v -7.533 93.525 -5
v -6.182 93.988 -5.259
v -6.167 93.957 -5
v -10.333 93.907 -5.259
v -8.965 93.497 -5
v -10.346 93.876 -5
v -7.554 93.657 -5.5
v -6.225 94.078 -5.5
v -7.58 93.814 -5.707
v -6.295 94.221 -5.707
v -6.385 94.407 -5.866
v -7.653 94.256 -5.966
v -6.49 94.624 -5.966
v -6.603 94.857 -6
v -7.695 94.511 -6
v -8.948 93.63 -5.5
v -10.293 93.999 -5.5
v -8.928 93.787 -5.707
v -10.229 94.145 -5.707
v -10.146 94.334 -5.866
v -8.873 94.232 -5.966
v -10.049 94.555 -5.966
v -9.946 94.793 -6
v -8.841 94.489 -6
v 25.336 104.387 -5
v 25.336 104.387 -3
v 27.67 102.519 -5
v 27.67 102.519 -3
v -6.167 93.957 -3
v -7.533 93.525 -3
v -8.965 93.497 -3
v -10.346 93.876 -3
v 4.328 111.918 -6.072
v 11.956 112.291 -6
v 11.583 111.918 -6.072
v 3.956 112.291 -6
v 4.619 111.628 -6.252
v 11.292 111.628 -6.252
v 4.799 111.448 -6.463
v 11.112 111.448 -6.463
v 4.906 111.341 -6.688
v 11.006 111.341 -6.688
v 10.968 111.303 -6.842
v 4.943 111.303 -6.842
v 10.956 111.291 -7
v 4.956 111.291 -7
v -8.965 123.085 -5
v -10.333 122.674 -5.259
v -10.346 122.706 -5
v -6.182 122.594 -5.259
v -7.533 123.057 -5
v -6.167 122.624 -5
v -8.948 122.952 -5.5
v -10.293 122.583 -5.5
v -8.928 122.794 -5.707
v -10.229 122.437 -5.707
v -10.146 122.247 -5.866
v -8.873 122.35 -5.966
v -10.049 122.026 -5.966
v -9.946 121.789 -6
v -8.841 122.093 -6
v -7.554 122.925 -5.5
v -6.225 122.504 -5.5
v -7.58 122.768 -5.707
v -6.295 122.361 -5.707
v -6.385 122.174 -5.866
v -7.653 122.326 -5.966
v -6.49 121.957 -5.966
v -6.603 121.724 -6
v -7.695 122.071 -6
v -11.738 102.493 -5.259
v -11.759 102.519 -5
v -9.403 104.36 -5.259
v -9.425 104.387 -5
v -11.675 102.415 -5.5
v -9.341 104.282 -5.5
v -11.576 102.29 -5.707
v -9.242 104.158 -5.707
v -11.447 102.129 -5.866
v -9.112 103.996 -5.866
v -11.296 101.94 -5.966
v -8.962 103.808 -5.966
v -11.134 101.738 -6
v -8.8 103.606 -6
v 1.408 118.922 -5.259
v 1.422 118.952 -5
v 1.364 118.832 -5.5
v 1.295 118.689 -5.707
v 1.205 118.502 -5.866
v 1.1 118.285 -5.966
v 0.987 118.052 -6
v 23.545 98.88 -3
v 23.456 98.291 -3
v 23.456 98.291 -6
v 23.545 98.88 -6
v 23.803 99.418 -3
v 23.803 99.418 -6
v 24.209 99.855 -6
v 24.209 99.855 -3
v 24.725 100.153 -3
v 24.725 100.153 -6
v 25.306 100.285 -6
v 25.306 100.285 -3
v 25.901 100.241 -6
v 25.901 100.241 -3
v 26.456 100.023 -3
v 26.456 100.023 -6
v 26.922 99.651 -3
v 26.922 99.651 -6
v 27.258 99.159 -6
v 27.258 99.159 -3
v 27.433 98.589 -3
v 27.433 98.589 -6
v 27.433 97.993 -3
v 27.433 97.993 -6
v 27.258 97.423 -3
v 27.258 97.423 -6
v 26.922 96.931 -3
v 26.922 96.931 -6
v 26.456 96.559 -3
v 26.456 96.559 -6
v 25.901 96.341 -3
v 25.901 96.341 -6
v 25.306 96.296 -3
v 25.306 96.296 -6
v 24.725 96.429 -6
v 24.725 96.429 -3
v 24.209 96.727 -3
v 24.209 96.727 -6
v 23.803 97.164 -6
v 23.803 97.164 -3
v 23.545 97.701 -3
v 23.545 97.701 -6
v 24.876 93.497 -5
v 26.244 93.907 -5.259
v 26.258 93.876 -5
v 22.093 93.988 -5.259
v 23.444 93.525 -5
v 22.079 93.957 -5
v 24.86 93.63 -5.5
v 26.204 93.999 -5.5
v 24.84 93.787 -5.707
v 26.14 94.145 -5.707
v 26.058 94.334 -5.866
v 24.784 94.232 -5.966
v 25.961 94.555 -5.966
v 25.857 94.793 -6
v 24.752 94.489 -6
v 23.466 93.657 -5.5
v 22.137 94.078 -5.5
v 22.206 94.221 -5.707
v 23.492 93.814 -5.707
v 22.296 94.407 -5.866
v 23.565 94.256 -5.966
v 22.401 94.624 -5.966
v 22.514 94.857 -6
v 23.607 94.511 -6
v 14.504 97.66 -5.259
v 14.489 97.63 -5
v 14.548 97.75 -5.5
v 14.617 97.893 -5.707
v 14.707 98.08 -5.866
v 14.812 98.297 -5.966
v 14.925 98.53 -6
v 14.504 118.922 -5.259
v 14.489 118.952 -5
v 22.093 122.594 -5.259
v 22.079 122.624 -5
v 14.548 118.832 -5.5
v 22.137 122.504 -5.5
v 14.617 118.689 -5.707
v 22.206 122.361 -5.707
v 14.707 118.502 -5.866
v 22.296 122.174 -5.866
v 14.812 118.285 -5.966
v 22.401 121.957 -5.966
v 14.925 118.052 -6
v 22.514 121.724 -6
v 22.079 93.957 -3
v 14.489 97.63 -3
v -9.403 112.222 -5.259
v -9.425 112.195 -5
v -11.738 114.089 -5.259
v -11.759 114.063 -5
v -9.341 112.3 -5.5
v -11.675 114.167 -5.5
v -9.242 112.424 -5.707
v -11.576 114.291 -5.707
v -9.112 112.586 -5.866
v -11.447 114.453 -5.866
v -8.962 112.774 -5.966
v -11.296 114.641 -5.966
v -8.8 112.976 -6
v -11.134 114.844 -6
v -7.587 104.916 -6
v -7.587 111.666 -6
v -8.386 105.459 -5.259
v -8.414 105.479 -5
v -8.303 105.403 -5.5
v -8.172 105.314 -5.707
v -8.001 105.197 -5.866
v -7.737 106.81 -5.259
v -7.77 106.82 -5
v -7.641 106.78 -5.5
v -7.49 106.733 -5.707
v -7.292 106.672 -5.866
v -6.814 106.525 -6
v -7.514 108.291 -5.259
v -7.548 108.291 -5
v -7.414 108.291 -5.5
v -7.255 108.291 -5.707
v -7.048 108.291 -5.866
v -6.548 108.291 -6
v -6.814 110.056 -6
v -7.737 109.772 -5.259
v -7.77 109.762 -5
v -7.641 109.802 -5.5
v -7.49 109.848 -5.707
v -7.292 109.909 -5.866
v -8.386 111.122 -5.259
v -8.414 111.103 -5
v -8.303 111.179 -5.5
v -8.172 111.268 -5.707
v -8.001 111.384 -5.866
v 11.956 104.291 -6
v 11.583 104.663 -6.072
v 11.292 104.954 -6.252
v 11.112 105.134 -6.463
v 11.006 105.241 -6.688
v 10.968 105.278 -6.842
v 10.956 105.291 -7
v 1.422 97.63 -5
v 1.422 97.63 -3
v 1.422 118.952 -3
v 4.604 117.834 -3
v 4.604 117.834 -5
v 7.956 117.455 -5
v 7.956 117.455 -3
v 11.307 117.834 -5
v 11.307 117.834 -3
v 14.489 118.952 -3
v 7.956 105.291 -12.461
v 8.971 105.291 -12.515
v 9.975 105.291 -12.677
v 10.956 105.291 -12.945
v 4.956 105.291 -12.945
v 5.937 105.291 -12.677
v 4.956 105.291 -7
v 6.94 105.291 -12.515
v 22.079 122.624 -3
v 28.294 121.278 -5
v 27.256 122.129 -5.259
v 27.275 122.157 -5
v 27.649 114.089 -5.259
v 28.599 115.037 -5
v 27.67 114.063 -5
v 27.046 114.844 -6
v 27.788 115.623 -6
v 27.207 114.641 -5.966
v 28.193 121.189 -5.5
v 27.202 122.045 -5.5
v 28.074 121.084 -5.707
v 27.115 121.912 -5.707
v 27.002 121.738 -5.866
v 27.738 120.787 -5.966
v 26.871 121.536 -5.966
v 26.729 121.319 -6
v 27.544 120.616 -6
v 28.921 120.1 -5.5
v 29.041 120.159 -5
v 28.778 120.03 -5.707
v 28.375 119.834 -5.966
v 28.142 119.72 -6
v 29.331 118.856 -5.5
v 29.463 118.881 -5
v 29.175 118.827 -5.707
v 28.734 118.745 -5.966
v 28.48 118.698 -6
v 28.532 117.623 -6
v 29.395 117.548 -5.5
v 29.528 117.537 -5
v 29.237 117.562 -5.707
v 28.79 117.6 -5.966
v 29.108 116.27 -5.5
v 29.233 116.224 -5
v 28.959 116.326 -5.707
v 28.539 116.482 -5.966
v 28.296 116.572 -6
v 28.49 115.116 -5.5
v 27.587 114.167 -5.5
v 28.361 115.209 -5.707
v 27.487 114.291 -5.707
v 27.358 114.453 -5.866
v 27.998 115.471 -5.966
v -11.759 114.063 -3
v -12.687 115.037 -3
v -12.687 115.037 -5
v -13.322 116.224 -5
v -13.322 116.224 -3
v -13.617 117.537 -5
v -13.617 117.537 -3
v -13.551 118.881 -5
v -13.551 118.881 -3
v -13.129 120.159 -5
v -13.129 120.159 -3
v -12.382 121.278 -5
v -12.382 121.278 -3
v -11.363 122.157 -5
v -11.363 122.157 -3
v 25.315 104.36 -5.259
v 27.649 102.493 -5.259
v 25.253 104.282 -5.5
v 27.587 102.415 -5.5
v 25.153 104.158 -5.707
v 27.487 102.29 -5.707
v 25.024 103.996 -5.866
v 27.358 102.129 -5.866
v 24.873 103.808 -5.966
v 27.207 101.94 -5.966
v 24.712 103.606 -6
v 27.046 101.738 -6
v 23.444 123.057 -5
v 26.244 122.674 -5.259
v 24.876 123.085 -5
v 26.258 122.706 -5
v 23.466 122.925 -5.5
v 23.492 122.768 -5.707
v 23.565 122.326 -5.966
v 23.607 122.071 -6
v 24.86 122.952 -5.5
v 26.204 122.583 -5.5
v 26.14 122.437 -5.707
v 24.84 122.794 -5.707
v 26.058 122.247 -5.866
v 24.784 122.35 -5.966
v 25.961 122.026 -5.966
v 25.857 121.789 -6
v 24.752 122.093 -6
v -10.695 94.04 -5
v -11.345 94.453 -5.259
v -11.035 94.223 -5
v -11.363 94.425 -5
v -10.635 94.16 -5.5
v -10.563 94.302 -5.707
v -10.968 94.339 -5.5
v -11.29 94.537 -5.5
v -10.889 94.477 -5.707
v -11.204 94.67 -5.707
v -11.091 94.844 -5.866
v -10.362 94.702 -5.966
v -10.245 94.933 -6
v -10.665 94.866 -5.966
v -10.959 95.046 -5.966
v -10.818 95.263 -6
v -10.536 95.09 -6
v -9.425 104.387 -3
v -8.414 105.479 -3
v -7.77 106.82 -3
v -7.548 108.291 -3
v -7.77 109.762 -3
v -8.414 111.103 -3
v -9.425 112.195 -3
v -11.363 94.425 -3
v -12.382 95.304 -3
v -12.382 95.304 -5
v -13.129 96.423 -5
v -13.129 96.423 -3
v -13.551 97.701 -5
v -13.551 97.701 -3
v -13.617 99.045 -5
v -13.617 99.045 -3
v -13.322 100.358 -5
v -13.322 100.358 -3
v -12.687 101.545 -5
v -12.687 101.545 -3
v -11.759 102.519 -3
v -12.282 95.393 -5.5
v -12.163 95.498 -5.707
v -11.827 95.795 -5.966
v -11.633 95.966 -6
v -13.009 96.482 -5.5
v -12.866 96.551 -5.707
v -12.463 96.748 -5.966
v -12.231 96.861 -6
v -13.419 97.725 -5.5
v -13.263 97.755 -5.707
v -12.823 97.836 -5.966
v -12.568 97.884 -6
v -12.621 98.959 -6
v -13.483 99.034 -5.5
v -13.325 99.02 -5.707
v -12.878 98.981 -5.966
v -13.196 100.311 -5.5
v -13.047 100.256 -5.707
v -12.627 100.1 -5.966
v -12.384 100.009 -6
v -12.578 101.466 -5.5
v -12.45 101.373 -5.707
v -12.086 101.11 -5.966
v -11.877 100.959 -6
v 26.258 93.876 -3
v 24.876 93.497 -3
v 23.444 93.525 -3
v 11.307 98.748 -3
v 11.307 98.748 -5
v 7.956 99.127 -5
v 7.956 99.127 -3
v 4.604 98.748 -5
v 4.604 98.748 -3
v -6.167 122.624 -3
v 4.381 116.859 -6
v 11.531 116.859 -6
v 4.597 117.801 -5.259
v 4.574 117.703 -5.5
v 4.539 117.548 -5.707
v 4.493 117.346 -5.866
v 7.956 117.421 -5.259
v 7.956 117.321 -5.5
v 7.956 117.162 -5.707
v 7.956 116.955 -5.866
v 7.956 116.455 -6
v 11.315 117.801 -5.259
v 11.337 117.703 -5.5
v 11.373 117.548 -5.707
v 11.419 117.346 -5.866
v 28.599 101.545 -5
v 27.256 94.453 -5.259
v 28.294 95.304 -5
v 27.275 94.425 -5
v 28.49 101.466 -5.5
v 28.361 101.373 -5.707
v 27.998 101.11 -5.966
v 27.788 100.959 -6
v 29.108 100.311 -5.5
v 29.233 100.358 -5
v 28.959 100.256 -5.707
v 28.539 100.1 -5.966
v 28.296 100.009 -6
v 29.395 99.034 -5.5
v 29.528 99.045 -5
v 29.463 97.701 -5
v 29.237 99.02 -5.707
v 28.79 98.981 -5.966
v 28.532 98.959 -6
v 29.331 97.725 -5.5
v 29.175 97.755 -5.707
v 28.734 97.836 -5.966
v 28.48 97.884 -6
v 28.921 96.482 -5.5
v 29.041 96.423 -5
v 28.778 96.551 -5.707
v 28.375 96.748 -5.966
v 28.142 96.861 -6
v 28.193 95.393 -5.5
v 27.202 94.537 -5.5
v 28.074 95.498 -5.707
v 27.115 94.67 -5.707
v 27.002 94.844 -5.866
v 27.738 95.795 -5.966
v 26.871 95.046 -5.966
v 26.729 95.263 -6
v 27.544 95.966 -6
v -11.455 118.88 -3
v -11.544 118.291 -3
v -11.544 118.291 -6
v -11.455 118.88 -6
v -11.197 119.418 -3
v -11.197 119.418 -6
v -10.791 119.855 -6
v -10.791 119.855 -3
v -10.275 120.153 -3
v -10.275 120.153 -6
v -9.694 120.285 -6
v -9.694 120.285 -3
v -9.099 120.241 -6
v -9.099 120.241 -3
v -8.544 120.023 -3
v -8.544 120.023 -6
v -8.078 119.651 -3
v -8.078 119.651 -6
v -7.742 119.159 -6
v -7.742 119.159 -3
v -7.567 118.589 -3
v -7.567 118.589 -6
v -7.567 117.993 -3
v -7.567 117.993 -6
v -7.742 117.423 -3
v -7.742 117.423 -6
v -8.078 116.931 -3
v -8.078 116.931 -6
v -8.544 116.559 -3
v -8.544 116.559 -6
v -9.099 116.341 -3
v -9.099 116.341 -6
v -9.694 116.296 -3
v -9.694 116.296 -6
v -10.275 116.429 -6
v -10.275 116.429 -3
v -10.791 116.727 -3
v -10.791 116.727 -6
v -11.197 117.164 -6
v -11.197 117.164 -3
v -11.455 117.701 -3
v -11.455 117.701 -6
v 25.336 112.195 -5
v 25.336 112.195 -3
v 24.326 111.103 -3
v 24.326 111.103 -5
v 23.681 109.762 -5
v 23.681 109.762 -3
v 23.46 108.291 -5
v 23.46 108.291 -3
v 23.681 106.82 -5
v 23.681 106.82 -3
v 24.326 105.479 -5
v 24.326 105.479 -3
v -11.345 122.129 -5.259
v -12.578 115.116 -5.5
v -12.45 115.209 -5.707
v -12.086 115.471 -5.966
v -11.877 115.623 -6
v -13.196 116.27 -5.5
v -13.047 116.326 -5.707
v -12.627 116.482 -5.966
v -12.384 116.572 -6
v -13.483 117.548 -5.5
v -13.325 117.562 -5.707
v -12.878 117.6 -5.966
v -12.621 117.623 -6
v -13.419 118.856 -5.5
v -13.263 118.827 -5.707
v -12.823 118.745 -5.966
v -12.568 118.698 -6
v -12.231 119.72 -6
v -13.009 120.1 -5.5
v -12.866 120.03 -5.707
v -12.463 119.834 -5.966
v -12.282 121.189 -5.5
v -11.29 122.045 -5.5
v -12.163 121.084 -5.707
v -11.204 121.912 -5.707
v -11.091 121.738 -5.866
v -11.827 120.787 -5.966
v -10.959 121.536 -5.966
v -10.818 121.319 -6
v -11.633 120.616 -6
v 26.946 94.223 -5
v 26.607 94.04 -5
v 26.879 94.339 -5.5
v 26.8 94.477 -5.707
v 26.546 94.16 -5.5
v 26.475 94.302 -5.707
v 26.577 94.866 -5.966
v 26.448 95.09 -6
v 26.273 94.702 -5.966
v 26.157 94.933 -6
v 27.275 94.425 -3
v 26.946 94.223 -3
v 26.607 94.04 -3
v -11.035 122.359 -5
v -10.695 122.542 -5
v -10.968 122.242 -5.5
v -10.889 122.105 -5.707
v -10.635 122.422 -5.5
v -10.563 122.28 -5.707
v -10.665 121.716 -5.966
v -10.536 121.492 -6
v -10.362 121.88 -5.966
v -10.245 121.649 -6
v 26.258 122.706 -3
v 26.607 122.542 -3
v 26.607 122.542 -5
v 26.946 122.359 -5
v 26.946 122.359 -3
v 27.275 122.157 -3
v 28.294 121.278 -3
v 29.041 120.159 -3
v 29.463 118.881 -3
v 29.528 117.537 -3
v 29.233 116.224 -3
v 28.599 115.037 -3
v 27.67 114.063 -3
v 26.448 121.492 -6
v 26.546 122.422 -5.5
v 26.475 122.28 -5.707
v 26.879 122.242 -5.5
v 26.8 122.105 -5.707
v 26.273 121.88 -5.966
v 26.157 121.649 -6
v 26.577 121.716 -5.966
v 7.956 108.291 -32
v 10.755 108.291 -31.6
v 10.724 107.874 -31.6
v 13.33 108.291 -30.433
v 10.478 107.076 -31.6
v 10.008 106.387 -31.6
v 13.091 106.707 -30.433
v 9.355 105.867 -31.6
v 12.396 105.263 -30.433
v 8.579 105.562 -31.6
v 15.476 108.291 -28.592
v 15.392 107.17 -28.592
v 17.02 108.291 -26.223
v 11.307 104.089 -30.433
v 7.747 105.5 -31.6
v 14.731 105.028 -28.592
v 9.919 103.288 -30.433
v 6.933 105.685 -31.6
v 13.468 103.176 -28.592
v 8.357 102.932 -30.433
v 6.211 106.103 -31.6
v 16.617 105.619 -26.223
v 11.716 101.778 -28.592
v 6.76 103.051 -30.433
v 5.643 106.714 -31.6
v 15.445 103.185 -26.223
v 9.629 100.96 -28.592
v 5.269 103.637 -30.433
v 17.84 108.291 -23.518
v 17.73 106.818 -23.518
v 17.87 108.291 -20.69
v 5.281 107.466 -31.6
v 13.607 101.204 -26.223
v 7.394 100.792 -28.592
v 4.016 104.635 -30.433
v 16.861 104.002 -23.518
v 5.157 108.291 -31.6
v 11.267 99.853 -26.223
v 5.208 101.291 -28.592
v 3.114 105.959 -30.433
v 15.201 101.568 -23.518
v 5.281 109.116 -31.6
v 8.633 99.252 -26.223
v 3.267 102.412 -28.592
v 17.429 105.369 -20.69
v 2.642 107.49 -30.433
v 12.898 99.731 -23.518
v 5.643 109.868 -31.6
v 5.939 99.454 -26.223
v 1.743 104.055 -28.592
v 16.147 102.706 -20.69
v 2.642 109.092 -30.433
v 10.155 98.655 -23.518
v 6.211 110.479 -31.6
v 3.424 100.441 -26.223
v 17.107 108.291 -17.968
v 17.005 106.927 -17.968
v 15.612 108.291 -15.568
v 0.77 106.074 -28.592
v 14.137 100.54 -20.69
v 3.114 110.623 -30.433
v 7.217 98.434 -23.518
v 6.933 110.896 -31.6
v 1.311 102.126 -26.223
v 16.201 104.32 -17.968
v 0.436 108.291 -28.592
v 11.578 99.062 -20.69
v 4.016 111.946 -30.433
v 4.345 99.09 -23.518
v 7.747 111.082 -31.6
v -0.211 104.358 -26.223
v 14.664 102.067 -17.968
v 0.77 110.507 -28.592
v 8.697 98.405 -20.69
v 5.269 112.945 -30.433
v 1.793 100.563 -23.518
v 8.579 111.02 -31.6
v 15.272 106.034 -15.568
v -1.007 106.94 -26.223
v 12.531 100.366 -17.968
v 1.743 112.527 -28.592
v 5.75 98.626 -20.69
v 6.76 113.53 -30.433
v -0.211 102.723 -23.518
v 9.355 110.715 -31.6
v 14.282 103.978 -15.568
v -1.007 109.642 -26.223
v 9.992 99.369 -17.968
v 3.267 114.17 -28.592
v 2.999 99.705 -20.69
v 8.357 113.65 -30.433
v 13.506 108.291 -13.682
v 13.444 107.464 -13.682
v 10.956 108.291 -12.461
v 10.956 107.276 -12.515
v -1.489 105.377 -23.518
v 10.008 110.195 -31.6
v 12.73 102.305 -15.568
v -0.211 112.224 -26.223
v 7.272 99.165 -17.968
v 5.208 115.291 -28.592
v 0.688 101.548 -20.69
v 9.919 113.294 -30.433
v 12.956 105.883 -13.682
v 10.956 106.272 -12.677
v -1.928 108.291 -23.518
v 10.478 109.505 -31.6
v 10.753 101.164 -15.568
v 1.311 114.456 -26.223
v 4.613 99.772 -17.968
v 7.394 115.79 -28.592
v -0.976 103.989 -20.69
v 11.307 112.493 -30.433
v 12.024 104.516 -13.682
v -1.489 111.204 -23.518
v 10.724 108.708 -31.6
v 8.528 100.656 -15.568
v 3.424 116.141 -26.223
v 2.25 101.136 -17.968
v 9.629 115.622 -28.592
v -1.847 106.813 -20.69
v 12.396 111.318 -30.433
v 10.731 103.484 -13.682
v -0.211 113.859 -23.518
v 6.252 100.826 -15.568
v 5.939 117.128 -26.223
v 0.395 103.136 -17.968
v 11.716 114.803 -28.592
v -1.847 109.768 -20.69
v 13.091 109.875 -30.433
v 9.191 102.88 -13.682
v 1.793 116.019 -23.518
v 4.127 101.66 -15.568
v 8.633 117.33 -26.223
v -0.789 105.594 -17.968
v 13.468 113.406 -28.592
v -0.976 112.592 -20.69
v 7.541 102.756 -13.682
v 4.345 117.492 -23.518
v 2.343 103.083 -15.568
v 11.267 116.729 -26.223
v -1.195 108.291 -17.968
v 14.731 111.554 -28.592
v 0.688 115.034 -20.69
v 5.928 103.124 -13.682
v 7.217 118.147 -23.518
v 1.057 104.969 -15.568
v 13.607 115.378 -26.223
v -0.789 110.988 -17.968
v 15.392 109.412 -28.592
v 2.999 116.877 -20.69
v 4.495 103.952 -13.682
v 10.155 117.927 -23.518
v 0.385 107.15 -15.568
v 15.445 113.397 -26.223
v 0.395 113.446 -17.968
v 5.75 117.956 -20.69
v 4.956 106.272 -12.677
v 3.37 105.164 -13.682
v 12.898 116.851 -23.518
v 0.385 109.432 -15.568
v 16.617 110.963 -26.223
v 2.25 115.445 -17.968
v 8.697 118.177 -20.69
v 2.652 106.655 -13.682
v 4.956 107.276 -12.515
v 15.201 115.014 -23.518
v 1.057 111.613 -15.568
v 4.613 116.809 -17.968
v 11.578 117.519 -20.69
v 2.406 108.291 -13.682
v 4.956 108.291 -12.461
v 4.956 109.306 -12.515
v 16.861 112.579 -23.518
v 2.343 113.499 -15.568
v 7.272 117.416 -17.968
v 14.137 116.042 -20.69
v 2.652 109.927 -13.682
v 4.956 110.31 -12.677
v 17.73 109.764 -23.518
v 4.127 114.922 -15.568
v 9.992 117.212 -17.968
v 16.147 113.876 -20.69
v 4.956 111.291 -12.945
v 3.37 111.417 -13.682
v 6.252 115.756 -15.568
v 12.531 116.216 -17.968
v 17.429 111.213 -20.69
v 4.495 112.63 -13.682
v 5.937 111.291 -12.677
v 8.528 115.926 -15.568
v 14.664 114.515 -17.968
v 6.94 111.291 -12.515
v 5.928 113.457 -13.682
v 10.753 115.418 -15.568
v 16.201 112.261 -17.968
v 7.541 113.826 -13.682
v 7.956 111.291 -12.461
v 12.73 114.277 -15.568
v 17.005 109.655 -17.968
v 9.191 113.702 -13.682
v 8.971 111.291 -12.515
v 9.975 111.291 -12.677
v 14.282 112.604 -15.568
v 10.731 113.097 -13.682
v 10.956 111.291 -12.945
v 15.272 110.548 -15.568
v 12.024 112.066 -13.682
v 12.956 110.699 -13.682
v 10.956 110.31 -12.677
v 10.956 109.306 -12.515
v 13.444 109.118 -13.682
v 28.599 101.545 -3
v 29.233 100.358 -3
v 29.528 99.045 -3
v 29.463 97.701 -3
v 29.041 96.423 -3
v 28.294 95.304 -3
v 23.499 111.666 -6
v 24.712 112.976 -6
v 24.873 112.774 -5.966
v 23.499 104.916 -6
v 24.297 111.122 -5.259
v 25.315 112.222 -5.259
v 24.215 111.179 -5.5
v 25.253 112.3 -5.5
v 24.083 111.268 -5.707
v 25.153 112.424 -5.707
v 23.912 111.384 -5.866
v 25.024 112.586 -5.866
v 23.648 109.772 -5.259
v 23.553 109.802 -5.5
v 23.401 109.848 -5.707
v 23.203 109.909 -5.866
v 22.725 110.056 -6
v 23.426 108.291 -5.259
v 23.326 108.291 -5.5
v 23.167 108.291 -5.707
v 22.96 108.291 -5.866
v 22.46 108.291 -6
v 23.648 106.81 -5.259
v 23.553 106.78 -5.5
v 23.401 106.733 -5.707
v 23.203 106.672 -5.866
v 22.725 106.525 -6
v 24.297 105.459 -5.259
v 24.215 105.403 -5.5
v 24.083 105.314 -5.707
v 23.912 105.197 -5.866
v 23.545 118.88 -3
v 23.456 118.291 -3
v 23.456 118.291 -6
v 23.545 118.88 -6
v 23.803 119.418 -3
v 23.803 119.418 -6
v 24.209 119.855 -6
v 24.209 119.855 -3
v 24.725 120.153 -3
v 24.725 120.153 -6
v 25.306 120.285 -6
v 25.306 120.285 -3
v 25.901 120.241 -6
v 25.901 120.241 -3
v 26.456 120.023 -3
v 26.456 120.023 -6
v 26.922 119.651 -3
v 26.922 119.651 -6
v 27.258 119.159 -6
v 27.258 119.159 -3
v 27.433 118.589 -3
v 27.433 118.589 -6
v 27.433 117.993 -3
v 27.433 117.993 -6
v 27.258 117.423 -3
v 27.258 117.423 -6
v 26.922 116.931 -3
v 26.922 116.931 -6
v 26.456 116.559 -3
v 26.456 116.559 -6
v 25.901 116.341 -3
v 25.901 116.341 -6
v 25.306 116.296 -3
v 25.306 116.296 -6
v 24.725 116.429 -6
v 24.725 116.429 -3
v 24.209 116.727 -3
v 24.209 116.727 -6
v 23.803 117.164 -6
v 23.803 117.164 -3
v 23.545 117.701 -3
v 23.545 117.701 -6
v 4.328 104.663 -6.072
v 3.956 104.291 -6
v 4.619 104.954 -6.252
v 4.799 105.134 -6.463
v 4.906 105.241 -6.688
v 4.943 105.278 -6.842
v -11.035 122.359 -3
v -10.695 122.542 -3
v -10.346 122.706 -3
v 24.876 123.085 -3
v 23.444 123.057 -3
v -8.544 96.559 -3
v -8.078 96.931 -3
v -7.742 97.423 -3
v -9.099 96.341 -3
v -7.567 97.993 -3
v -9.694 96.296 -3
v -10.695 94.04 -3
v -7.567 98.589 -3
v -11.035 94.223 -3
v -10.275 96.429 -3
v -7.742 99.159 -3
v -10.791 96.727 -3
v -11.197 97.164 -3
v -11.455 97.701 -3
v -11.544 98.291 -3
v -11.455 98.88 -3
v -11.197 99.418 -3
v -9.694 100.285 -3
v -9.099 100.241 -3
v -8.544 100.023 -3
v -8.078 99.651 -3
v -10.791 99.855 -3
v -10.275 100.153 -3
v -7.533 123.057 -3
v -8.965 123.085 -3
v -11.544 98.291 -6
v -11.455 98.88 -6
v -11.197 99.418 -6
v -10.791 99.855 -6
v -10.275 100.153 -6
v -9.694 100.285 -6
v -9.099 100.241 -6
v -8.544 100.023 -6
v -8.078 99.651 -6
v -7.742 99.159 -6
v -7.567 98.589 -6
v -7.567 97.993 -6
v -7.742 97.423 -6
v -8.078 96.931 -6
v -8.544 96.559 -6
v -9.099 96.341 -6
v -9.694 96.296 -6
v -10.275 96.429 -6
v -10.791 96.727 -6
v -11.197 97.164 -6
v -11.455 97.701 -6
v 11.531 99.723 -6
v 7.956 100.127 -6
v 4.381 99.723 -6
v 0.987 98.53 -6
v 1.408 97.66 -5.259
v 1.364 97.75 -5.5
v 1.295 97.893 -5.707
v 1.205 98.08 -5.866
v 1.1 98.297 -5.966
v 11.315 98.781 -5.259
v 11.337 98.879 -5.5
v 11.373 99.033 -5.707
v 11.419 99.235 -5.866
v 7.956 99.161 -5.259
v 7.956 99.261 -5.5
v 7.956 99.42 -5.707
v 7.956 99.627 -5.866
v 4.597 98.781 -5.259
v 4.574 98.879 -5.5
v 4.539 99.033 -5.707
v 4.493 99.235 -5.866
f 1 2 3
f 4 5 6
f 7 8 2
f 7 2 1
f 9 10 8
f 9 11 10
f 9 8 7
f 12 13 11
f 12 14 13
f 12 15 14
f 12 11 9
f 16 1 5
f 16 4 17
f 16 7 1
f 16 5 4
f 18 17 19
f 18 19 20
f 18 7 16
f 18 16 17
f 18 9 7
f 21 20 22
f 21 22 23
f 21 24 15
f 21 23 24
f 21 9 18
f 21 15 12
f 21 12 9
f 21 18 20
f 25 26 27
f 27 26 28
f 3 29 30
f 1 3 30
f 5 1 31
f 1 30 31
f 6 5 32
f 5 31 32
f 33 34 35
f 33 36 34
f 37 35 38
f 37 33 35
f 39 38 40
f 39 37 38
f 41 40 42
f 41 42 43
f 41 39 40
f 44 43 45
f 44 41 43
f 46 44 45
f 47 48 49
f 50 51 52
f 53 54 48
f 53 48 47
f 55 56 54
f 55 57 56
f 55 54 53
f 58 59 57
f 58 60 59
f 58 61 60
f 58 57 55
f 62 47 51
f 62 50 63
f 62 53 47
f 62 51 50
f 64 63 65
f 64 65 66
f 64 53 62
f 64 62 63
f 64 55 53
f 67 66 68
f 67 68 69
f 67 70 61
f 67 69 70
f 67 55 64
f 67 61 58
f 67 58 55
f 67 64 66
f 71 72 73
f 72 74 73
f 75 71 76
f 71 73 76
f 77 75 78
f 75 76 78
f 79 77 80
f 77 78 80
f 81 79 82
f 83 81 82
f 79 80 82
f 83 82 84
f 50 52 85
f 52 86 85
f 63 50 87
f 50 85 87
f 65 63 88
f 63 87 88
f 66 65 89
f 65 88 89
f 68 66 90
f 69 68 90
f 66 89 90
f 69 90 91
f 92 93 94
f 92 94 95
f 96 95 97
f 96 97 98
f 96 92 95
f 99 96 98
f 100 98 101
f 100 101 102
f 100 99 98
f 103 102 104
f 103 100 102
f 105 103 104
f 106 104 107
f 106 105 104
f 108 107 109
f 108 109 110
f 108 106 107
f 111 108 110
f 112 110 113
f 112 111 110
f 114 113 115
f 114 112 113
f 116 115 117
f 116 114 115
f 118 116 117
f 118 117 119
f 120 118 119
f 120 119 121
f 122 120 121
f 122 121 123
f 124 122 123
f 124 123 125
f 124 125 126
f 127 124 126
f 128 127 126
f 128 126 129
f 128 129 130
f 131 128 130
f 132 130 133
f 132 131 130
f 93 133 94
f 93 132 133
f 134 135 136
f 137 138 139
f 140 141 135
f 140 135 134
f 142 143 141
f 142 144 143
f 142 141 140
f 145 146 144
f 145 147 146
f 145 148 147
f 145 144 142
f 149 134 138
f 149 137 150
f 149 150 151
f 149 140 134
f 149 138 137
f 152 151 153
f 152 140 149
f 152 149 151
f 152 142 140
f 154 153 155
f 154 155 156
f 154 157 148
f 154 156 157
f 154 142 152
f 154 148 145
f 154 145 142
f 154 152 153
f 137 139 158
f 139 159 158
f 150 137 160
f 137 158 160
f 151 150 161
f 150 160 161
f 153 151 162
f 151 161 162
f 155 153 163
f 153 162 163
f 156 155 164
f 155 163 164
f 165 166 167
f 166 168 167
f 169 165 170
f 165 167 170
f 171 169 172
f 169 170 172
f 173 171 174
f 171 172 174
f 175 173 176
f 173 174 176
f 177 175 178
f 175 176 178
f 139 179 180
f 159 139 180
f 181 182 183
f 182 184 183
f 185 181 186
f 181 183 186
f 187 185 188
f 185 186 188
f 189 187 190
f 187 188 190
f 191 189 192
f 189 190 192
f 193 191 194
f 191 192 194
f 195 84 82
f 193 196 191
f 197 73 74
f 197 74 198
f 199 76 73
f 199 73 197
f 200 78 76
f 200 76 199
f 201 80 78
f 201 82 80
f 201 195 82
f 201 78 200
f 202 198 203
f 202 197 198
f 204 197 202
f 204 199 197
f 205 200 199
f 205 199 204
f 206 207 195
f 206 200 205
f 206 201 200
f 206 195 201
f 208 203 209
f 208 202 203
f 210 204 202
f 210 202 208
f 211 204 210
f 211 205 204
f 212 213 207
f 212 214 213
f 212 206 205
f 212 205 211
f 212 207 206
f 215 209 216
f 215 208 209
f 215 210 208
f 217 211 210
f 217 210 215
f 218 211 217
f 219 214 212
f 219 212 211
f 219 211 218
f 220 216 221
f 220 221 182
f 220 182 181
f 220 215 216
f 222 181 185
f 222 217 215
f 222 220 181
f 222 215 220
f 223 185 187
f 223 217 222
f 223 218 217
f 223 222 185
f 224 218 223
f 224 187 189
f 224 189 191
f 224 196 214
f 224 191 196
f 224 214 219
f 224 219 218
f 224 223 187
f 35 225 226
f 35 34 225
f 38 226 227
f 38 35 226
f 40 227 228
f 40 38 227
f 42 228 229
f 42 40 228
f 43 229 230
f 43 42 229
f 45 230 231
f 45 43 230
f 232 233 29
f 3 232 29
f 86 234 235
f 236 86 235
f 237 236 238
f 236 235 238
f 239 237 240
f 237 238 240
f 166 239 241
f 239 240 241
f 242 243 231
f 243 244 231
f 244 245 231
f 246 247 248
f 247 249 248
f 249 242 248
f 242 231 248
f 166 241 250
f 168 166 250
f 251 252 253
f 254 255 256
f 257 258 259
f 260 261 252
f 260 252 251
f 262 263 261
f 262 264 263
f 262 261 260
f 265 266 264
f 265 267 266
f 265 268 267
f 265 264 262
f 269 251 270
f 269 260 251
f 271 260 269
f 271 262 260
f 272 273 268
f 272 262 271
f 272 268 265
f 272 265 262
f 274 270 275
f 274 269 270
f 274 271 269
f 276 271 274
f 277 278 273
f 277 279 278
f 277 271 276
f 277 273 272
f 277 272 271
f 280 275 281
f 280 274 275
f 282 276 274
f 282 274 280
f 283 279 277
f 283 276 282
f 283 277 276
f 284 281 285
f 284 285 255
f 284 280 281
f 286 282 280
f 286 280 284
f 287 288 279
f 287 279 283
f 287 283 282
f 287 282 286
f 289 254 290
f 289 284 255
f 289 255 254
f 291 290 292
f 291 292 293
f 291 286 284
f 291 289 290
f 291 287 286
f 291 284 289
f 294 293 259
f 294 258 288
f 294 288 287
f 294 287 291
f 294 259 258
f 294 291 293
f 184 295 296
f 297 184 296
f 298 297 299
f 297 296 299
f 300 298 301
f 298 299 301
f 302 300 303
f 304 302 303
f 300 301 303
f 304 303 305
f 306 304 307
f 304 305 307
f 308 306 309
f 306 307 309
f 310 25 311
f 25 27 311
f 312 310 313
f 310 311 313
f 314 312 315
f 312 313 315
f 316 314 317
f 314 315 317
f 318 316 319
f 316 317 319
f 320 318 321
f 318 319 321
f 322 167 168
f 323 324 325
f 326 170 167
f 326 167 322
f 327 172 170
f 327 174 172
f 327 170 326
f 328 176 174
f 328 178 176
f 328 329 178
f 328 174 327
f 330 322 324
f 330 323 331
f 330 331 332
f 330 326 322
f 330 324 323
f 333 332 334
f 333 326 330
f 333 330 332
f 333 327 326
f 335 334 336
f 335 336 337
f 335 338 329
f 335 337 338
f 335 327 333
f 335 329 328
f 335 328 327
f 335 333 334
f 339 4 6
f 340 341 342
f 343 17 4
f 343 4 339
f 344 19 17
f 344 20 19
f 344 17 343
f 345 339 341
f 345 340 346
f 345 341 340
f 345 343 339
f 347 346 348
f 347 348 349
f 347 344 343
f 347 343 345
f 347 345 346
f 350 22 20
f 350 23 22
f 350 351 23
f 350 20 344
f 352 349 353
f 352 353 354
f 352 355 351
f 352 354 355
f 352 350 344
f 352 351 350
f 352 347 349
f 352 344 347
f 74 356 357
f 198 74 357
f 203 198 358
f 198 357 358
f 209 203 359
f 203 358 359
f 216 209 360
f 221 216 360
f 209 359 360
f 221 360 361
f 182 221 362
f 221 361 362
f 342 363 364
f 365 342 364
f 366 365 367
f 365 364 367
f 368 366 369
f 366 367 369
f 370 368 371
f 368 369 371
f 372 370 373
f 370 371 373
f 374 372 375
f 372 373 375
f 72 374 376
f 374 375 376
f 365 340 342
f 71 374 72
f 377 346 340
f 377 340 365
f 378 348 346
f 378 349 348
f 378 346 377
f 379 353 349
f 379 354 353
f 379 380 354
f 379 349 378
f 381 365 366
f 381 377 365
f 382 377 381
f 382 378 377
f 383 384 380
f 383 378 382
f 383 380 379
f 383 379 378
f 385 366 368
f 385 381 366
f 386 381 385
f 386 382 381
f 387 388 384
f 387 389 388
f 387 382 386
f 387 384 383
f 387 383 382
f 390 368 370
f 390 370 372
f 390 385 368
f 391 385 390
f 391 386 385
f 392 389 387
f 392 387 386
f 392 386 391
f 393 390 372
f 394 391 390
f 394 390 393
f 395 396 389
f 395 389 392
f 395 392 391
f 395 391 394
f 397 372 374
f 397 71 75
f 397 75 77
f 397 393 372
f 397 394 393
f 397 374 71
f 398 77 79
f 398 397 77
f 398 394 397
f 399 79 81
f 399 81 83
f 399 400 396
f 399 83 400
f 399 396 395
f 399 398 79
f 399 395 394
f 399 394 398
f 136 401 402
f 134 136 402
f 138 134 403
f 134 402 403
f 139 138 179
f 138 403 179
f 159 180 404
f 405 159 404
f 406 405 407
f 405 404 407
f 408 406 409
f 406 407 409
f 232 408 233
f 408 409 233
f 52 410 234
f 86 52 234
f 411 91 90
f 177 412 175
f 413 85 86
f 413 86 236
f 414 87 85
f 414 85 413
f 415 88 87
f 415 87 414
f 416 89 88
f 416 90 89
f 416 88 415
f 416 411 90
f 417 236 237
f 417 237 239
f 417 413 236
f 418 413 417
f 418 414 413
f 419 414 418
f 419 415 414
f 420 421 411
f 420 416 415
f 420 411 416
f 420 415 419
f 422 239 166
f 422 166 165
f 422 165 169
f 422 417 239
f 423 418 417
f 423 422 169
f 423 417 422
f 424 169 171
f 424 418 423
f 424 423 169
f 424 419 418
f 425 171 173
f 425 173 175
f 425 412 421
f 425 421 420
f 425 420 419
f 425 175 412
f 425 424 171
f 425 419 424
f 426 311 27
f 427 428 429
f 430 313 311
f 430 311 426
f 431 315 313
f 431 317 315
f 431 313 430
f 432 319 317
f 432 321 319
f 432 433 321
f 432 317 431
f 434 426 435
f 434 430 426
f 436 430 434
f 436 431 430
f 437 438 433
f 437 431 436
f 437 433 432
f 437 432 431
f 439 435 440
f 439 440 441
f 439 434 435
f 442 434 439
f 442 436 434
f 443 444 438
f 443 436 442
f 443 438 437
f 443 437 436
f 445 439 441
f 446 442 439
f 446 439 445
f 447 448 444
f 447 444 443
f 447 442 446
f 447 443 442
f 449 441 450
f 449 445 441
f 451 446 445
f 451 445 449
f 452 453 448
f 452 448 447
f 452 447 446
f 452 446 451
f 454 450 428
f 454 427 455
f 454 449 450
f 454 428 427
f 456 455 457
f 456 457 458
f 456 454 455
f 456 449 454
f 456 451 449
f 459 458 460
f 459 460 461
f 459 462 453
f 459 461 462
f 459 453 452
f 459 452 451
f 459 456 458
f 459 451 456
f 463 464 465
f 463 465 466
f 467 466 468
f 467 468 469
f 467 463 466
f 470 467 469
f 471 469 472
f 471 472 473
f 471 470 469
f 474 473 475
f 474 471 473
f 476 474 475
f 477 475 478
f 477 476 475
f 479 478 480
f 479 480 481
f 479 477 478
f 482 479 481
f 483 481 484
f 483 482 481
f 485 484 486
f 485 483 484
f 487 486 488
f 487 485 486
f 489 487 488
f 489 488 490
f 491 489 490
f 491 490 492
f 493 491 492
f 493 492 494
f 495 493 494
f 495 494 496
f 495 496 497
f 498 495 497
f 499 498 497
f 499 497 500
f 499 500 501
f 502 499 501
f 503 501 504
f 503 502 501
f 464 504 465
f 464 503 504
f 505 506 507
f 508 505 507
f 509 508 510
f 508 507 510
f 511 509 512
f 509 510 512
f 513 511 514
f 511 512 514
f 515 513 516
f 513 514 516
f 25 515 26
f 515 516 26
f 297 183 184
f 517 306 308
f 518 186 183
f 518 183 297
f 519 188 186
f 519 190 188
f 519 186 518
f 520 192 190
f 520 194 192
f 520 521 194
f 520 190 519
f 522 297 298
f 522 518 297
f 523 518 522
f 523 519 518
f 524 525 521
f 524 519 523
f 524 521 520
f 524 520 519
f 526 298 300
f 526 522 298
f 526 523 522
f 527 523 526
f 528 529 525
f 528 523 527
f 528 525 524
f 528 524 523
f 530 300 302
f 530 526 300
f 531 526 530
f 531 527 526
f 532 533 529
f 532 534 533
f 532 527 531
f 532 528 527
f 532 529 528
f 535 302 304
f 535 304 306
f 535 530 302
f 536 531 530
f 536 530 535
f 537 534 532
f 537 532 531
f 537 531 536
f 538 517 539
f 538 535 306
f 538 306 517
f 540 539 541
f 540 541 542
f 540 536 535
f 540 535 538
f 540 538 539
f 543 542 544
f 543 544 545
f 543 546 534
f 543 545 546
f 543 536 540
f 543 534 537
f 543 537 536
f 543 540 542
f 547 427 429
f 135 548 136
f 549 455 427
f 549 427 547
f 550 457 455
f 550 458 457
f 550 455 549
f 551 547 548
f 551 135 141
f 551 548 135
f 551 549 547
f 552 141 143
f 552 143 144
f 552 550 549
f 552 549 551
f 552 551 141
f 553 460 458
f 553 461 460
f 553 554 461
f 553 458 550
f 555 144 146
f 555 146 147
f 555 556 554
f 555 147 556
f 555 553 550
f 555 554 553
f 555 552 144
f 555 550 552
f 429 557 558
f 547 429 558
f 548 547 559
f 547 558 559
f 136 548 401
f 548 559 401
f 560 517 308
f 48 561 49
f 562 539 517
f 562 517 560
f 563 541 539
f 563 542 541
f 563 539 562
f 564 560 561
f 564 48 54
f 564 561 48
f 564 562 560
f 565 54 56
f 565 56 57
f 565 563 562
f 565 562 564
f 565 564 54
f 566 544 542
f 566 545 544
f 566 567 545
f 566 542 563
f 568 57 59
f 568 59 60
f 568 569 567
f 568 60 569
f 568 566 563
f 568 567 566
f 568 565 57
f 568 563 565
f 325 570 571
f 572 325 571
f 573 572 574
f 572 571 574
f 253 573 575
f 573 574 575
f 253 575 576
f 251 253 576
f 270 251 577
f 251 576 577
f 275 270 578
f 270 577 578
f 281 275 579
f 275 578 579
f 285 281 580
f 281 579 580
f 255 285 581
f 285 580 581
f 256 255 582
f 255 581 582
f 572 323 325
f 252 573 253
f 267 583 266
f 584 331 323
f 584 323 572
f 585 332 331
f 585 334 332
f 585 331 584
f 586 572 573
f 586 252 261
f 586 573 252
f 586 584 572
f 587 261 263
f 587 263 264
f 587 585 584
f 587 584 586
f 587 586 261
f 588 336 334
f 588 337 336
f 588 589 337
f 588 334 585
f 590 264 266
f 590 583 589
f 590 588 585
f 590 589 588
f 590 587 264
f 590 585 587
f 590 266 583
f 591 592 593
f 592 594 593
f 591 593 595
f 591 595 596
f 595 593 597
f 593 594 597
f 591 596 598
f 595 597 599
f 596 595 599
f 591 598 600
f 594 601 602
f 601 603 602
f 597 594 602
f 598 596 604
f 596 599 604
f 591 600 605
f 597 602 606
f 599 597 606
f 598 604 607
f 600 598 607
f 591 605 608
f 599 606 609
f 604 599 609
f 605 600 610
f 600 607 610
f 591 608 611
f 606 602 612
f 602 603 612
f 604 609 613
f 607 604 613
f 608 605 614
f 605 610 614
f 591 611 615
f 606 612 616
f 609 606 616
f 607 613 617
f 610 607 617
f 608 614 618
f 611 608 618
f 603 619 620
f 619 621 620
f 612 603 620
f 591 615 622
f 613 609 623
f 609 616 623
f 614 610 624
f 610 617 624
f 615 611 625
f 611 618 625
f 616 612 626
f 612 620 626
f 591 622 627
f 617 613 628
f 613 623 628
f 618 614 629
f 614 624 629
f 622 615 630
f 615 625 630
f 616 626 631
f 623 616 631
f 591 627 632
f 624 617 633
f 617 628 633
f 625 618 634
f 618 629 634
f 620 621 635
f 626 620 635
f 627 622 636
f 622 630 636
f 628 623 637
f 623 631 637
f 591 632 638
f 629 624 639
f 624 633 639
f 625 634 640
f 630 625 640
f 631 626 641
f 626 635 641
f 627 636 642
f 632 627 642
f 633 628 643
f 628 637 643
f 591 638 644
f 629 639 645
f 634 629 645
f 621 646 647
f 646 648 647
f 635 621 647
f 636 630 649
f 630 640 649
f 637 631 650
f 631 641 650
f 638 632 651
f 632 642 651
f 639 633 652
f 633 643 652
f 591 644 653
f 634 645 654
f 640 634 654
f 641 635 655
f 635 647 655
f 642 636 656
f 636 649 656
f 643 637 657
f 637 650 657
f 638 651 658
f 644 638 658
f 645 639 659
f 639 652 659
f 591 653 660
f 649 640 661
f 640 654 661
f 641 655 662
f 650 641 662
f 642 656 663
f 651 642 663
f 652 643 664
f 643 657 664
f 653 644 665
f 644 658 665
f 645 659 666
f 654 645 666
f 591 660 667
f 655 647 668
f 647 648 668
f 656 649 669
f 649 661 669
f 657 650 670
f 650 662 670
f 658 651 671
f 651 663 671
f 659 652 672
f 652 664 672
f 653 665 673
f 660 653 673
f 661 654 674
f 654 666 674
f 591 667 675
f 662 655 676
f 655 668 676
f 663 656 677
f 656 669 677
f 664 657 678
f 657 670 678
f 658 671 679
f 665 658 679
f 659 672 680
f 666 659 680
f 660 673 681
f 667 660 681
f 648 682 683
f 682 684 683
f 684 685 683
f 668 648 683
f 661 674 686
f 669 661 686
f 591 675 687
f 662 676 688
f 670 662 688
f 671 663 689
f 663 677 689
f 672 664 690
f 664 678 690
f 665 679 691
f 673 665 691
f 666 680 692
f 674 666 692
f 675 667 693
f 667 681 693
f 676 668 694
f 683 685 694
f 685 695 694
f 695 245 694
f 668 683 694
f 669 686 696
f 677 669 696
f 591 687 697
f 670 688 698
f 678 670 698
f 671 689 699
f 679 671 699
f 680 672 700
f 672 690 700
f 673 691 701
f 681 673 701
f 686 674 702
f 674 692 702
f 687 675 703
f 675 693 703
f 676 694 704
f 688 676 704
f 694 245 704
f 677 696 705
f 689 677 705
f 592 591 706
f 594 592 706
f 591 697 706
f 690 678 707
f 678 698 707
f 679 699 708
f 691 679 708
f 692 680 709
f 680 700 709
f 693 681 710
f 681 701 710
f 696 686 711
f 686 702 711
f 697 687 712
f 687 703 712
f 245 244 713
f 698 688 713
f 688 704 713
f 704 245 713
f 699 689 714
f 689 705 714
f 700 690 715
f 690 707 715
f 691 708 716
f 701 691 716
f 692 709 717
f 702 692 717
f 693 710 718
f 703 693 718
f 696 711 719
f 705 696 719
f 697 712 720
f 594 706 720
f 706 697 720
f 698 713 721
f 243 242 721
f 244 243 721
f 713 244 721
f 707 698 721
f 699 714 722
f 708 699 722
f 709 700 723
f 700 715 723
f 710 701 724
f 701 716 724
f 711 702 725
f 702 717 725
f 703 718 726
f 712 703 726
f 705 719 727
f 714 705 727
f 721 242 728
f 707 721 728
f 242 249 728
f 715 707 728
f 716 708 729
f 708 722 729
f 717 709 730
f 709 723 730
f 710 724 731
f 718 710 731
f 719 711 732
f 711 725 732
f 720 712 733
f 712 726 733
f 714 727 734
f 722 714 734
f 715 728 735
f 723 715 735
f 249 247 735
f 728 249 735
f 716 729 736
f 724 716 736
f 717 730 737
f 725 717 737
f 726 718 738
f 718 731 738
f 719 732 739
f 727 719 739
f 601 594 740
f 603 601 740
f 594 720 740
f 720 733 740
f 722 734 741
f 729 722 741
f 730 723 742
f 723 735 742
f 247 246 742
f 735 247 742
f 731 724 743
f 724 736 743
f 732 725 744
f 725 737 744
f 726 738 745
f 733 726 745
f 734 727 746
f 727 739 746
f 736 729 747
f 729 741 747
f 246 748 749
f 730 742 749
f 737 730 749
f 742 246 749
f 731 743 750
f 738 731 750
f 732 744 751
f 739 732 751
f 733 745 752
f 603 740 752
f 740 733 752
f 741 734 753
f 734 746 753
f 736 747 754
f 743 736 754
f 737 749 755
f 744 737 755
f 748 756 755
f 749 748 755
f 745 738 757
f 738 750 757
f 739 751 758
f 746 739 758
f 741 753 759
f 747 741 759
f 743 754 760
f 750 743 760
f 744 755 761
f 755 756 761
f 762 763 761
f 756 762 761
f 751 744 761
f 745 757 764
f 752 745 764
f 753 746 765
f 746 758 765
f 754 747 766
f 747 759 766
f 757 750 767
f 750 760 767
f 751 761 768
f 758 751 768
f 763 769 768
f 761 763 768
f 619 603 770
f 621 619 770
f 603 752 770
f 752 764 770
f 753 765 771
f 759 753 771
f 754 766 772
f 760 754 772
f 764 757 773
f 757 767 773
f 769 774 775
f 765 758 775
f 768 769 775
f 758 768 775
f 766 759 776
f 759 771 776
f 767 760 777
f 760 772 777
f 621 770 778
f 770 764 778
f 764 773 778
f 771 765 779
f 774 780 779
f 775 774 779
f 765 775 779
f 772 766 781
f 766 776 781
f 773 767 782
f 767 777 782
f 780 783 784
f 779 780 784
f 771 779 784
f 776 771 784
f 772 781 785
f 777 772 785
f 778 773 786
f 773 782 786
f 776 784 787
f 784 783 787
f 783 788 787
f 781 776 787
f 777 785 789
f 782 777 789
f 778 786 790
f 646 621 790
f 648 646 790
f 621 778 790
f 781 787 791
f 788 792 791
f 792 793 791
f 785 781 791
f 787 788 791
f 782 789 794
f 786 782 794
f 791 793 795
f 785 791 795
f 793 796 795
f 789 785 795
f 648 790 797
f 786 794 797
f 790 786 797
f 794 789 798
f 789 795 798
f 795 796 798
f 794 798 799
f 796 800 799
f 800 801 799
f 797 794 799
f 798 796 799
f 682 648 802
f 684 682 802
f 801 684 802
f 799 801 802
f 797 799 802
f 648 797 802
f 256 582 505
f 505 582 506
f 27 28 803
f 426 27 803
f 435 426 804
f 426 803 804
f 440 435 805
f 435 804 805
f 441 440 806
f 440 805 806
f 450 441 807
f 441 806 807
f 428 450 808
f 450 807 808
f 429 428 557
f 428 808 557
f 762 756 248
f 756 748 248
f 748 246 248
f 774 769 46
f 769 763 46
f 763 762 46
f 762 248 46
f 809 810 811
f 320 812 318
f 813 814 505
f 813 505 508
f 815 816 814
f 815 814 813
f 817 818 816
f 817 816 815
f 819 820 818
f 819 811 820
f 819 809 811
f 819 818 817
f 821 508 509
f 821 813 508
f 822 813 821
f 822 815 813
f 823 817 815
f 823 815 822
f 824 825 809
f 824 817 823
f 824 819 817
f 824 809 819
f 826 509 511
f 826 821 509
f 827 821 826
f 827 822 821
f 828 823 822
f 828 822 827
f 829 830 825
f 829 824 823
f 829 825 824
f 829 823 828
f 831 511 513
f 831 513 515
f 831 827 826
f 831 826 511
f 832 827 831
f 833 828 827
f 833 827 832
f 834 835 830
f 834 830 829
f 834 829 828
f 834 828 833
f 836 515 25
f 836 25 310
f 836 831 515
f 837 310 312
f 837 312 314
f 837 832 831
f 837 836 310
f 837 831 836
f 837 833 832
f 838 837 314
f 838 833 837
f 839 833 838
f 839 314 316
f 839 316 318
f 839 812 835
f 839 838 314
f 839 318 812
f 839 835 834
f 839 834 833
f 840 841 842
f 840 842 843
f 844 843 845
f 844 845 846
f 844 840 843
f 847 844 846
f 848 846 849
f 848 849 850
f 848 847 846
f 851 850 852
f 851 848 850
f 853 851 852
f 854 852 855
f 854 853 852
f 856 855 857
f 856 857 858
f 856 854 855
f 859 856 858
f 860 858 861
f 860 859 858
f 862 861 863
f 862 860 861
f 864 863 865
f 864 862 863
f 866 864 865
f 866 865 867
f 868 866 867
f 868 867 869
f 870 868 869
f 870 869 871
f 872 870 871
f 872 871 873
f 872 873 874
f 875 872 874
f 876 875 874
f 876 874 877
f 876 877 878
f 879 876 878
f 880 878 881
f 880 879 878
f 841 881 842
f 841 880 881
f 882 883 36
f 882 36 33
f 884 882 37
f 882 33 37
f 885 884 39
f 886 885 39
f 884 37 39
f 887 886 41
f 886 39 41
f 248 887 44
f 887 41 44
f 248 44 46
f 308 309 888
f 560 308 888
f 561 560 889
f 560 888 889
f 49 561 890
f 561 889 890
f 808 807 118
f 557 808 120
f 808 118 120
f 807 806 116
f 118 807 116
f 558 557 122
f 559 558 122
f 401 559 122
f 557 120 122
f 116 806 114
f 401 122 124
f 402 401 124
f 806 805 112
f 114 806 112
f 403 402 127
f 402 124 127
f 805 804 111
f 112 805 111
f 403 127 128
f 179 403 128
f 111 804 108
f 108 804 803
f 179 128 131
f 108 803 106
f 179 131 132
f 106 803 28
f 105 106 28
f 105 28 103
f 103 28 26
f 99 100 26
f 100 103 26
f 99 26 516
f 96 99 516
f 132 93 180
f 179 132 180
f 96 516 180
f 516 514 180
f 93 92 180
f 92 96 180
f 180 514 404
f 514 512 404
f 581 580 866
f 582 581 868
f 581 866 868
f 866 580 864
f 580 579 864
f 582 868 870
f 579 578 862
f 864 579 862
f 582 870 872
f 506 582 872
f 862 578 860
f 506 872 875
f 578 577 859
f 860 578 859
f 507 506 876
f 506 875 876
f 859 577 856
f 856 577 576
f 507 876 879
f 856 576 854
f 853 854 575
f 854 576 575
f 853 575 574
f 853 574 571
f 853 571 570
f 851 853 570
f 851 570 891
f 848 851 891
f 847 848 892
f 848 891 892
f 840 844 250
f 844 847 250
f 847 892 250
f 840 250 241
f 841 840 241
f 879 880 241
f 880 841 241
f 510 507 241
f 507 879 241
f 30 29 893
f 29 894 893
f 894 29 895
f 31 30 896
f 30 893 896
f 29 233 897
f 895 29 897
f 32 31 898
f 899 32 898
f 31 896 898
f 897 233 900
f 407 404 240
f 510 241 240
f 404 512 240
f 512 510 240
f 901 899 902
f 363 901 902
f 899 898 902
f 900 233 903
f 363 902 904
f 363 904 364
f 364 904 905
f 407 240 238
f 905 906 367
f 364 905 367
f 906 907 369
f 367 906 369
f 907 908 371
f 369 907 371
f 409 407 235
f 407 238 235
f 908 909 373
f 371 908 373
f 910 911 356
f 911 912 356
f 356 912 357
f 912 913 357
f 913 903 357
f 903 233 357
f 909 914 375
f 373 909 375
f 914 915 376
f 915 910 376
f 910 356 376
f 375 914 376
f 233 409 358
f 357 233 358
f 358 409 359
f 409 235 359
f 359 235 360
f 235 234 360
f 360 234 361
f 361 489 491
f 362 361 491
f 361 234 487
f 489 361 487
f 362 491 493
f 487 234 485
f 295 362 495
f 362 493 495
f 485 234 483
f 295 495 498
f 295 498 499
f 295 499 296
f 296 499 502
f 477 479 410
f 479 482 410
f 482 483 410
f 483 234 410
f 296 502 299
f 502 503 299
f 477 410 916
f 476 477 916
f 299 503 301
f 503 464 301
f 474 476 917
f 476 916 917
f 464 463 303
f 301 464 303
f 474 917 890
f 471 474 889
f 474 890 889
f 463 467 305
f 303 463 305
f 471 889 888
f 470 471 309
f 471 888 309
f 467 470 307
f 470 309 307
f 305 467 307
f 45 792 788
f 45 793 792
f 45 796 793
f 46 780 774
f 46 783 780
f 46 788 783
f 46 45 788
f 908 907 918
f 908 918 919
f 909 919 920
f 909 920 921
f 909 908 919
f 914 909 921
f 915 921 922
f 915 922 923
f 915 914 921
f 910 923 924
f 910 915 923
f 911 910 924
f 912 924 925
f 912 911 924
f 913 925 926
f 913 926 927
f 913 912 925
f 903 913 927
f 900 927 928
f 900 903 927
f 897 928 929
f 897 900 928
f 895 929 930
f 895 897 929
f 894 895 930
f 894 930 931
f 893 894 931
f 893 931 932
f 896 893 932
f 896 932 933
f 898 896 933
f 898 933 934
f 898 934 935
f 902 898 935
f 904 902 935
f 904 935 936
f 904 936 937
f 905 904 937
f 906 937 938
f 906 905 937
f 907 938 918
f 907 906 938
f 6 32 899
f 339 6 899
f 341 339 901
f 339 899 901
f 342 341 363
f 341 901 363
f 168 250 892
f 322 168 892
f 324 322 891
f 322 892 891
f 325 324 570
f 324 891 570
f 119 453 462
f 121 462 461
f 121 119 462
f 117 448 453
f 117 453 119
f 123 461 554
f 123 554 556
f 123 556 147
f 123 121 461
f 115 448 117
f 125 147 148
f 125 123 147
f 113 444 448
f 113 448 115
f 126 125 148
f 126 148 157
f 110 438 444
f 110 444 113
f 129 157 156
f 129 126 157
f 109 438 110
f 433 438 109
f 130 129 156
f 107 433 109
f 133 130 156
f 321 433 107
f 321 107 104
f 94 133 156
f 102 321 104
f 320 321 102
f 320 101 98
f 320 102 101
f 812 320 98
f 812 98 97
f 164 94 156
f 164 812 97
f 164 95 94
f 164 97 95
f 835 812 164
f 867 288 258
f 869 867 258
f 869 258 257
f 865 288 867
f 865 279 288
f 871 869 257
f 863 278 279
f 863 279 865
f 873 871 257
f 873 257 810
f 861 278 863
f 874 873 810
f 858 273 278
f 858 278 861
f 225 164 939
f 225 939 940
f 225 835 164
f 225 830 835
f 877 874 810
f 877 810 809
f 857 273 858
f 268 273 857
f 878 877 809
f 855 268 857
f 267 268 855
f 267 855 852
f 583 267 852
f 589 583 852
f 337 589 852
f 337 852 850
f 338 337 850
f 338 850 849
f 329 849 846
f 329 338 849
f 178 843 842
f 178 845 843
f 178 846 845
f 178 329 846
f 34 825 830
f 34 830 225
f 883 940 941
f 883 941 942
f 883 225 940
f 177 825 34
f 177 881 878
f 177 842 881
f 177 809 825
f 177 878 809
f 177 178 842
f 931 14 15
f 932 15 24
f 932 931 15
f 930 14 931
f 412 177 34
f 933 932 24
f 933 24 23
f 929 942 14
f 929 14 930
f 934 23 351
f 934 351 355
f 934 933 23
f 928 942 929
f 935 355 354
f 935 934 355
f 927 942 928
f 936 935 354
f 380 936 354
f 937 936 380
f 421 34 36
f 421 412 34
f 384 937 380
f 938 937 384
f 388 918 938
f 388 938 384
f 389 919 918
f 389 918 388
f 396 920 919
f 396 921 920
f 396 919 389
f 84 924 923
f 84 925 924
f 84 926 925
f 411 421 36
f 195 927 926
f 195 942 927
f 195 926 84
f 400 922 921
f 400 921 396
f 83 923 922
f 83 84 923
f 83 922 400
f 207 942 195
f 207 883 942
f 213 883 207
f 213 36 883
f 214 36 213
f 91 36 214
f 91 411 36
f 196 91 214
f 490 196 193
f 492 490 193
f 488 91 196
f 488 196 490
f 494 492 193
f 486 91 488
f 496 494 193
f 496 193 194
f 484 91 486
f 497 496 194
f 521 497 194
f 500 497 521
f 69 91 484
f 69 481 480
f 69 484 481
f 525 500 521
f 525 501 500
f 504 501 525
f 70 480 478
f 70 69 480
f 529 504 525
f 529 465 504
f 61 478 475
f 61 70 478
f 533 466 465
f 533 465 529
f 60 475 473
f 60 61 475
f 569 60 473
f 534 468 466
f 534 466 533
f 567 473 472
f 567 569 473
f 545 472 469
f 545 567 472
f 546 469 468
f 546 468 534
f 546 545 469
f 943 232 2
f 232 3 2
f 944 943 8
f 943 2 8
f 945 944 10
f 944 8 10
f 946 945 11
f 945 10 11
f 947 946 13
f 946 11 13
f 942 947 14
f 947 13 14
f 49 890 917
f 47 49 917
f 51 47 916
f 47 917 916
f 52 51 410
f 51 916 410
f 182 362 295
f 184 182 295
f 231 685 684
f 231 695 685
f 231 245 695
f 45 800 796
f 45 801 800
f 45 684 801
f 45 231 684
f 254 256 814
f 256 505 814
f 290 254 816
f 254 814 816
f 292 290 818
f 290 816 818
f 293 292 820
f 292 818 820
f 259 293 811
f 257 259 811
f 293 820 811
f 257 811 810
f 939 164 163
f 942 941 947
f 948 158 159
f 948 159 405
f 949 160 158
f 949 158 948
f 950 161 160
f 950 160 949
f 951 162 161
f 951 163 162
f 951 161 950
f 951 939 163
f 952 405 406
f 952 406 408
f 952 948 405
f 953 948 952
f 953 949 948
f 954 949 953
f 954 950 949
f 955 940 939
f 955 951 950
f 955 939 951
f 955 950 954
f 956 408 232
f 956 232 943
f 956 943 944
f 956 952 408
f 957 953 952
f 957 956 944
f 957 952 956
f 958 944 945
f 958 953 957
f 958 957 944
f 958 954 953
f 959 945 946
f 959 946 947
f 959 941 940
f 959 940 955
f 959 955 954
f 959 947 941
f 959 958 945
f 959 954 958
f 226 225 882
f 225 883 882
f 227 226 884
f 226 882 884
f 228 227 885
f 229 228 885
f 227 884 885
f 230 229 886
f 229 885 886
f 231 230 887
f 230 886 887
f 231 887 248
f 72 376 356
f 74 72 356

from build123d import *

# Parameters (mm, degrees)
SKETCH1_R           = 2
BOSS_EXTRUDE1_DEPTH = 3
FILLET1_R           = 1
SKETCH2_W           = 6
SKETCH2_H           = 6
BOSS_EXTRUDE2_DEPTH = 13
FILLET4_R           = 1


with BuildPart() as part:
    # Sketch1 → Boss-Extrude1 (new body)
    with BuildSketch(Plane(origin=(0, 0, -3), x_dir=(-1, 0, 0), z_dir=(0, 0, -1))):
        with BuildLine():
            Line((-22.078522838, 93.957303237), (-14.489191473, 97.629560349))
            ThreePointArc((-14.489191473, 97.629560349), (-7.955777551, 99.127171578), (-1.42236363, 97.629560349))
            Line((-1.42236363, 97.629560349), (6.166967735, 93.957303237))
            ThreePointArc((6.166967735, 93.957303237), (8.247667355, 93.459042522), (10.346147194, 93.876124065))
            ThreePointArc((10.346147194, 93.876124065), (10.86613185, 94.129321852), (11.363439854, 94.424580911))
            ThreePointArc((11.363439854, 94.424580911), (13.629470969, 98.370815693), (11.75890266, 102.519145498))
            Line((11.75890266, 102.519145498), (9.424652508, 104.386545619))
            ThreePointArc((9.424652508, 104.386545619), (7.548127746, 108.290889666), (9.424652508, 112.195233714))
            Line((9.424652508, 112.195233714), (11.75890266, 114.062633835))
            ThreePointArc((11.75890266, 114.062633835), (13.629470969, 118.21096364), (11.363439854, 122.157198422))
            ThreePointArc((11.363439854, 122.157198422), (10.86613185, 122.452457481), (10.346147194, 122.705655268))
            ThreePointArc((10.346147194, 122.705655268), (8.247667355, 123.122736811), (6.166967735, 122.624476095))
            Line((6.166967735, 122.624476095), (-1.42236363, 118.952218983))
            ThreePointArc((-1.42236363, 118.952218983), (-7.955777551, 117.454607754), (-14.489191473, 118.952218983))
            Line((-14.489191473, 118.952218983), (-22.078522838, 122.624476095))
            ThreePointArc((-22.078522838, 122.624476095), (-24.159222457, 123.122736811), (-26.257702296, 122.705655268))
            ThreePointArc((-26.257702296, 122.705655268), (-26.777686952, 122.452457481), (-27.274994956, 122.157198422))
            ThreePointArc((-27.274994956, 122.157198422), (-29.541026071, 118.21096364), (-27.670457762, 114.062633835))
            Line((-27.670457762, 114.062633835), (-25.33620761, 112.195233714))
            ThreePointArc((-25.33620761, 112.195233714), (-23.459682848, 108.290889666), (-25.33620761, 104.386545619))
            Line((-25.33620761, 104.386545619), (-27.670457762, 102.519145498))
            ThreePointArc((-27.670457762, 102.519145498), (-29.541026071, 98.370815693), (-27.274994956, 94.424580911))
            ThreePointArc((-27.274994956, 94.424580911), (-26.777686952, 94.129321852), (-26.257702296, 93.876124065))
            ThreePointArc((-26.257702296, 93.876124065), (-24.159222457, 93.459042522), (-22.078522838, 93.957303237))
        make_face()
        with Locations((-25.455777551, 118.290889666)):
            Circle(SKETCH1_R, mode=Mode.SUBTRACT)
        with Locations((9.544222449, 118.290889666)):
            Circle(SKETCH1_R, mode=Mode.SUBTRACT)
        with Locations((-25.455777551, 98.290889666)):
            Circle(SKETCH1_R, mode=Mode.SUBTRACT)
        with Locations((9.544222449, 98.290889666)):
            Circle(SKETCH1_R, mode=Mode.SUBTRACT)
    extrude(amount=BOSS_EXTRUDE1_DEPTH)

    # Fillet1
    fillet1_edges = [part.edges().sort_by_distance(p)[0] for p in [
        (18.283857155, 95.793431793, -6),
        (7.955777551, 99.127171578, -6),
    ]]
    fillet(fillet1_edges, radius=FILLET1_R)

    # Sketch2 → Boss-Extrude2 (add)
    with BuildSketch(Plane(origin=(0, 0, -6), x_dir=(-1, 0, 0), z_dir=(0, 0, -1))):
        with Locations((-7.955777551, 108.290889666)):
            Rectangle(SKETCH2_W, SKETCH2_H)
    extrude(amount=BOSS_EXTRUDE2_DEPTH)

    # Fillet4
    fillet4_edges = [part.edges().sort_by_distance(p)[0] for p in [
        (7.955777551, 105.290889666, -6),
        (10.955777551, 108.290889666, -6),
        (7.955777551, 111.290889666, -6),
        (4.955777551, 108.290889666, -6),
    ]]
    fillet(fillet4_edges, radius=FILLET4_R)

    # Sketch4 → Revolve2 (revolve)
    with BuildSketch(Plane(origin=(0, 108.290889666, 0), x_dir=(0, 0, -1), z_dir=(0, 1, 0))):
        with BuildLine():
            Line((12, -7.955777551), (32, -7.955777551))
            ThreePointArc((32, -7.955777551), (22, -17.955777551), (12, -7.955777551))
        make_face()
    revolve(axis=Axis((7.955777551, 108.290889666, -12), (0, 0, -1)))


solid = part.part
